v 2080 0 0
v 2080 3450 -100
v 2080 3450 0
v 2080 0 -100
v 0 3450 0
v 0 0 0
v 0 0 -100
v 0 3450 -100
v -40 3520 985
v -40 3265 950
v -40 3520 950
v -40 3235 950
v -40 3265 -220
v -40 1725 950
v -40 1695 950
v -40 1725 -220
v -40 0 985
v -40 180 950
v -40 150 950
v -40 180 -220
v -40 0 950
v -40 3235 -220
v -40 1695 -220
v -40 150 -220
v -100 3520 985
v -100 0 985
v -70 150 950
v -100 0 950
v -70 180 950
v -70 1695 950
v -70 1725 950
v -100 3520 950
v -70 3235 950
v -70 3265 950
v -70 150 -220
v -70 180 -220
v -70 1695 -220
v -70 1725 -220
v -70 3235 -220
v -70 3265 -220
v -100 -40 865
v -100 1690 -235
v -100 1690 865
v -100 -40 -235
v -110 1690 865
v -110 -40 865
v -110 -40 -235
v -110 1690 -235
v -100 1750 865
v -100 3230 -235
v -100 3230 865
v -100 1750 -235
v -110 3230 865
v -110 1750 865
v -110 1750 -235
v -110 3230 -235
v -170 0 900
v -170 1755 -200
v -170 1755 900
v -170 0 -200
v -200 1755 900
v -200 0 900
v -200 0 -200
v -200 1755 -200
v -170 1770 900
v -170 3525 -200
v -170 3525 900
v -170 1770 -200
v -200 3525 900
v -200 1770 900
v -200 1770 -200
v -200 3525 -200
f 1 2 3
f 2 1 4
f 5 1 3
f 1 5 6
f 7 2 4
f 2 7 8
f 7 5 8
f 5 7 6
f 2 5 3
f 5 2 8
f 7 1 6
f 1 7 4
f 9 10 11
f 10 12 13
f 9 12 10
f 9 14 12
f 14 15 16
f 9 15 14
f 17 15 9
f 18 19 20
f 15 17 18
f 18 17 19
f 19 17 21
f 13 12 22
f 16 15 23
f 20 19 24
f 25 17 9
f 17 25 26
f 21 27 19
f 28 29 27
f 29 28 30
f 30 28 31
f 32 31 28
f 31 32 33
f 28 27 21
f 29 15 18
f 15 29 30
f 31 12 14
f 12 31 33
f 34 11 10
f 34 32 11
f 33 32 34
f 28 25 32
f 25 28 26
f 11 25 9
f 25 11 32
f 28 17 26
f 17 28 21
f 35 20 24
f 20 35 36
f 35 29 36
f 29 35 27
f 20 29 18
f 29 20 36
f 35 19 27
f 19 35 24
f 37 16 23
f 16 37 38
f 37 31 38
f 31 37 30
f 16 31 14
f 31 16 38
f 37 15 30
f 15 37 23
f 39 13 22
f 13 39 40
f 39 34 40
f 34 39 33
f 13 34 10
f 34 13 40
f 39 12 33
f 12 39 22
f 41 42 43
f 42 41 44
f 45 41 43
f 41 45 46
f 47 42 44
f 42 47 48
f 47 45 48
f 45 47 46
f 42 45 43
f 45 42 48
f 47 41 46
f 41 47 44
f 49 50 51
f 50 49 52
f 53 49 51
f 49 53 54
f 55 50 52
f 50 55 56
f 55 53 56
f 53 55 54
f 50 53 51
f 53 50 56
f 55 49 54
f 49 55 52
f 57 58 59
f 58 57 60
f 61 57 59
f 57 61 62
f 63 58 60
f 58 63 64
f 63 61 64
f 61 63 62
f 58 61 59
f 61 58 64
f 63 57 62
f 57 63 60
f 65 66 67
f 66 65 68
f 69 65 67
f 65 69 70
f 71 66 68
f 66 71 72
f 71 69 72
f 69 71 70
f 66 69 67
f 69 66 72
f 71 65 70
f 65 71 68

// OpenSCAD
//handrail
handRailH=35;
handRailD=60;
handRailL=3.52*10*100;
//Post(s)
postX=30;
postY=30;
postH=1.17*10*100;
postOff=handRailD-postY;
post1Pos=15*10;
post2Pos=1.695*10*100;
post3Pos=3.235*10*100;
//Balcony
balconyD=2.08*10*100;
balconyW=3.45*10*100;
railOff=[-100,0,95*10];
blech1W=1.73*10*100;
blech1H=1.10*10*100;
blech1OffX=-2.5*10;//inside post1pos
blech1OffY=-8.5*10;//inside RailH
blech2W=1.48*10*100;
blech2H=1.10*10*100;
blech2OffX=-2.5*10;//inside post1pos
blech2OffY=blech1OffY;
//solar panel
panelW=1.755*10*100;//m
panelH=1.10*10*100;//m
panelD=30;//mm
module HandRail() {
    color([.6,.6,.6])
        translate (railOff)
            cube([handRailD,handRailL,handRailH]);
}
module Post(pos) {
    color([.6,.6,.6])
        translate (railOff)
            translate([postOff,pos,-postH])
                cube([postX,postY,postH]);
}
module Blech(pos,w,h) {
    color([.6,.6,.6])
        translate (railOff)
            translate([0,pos,0])
                translate ([-10,-w,-h + blech1OffY])
                    cube([10,w,h]);
}
module Panel(x,y,z) {
    color([.1,.1,.3])
        translate([x,y,z])
            translate([0,0,0])
                cube([panelD,panelW,panelH]);
}
//balcony
color([.8,.8,.8]) translate ([0,0,-100]) cube([balconyD,balconyW,100]);

HandRail();
Post(post1Pos);
Post(post2Pos);
Post(post3Pos);
Blech(post2Pos-postX-blech1OffX,blech1W,blech1H);
Blech(post3Pos-postX-blech2OffX,blech2W,blech2H);

Panel(-200,0,-200);
Panel(-200,1.75*1000+20,-200);
